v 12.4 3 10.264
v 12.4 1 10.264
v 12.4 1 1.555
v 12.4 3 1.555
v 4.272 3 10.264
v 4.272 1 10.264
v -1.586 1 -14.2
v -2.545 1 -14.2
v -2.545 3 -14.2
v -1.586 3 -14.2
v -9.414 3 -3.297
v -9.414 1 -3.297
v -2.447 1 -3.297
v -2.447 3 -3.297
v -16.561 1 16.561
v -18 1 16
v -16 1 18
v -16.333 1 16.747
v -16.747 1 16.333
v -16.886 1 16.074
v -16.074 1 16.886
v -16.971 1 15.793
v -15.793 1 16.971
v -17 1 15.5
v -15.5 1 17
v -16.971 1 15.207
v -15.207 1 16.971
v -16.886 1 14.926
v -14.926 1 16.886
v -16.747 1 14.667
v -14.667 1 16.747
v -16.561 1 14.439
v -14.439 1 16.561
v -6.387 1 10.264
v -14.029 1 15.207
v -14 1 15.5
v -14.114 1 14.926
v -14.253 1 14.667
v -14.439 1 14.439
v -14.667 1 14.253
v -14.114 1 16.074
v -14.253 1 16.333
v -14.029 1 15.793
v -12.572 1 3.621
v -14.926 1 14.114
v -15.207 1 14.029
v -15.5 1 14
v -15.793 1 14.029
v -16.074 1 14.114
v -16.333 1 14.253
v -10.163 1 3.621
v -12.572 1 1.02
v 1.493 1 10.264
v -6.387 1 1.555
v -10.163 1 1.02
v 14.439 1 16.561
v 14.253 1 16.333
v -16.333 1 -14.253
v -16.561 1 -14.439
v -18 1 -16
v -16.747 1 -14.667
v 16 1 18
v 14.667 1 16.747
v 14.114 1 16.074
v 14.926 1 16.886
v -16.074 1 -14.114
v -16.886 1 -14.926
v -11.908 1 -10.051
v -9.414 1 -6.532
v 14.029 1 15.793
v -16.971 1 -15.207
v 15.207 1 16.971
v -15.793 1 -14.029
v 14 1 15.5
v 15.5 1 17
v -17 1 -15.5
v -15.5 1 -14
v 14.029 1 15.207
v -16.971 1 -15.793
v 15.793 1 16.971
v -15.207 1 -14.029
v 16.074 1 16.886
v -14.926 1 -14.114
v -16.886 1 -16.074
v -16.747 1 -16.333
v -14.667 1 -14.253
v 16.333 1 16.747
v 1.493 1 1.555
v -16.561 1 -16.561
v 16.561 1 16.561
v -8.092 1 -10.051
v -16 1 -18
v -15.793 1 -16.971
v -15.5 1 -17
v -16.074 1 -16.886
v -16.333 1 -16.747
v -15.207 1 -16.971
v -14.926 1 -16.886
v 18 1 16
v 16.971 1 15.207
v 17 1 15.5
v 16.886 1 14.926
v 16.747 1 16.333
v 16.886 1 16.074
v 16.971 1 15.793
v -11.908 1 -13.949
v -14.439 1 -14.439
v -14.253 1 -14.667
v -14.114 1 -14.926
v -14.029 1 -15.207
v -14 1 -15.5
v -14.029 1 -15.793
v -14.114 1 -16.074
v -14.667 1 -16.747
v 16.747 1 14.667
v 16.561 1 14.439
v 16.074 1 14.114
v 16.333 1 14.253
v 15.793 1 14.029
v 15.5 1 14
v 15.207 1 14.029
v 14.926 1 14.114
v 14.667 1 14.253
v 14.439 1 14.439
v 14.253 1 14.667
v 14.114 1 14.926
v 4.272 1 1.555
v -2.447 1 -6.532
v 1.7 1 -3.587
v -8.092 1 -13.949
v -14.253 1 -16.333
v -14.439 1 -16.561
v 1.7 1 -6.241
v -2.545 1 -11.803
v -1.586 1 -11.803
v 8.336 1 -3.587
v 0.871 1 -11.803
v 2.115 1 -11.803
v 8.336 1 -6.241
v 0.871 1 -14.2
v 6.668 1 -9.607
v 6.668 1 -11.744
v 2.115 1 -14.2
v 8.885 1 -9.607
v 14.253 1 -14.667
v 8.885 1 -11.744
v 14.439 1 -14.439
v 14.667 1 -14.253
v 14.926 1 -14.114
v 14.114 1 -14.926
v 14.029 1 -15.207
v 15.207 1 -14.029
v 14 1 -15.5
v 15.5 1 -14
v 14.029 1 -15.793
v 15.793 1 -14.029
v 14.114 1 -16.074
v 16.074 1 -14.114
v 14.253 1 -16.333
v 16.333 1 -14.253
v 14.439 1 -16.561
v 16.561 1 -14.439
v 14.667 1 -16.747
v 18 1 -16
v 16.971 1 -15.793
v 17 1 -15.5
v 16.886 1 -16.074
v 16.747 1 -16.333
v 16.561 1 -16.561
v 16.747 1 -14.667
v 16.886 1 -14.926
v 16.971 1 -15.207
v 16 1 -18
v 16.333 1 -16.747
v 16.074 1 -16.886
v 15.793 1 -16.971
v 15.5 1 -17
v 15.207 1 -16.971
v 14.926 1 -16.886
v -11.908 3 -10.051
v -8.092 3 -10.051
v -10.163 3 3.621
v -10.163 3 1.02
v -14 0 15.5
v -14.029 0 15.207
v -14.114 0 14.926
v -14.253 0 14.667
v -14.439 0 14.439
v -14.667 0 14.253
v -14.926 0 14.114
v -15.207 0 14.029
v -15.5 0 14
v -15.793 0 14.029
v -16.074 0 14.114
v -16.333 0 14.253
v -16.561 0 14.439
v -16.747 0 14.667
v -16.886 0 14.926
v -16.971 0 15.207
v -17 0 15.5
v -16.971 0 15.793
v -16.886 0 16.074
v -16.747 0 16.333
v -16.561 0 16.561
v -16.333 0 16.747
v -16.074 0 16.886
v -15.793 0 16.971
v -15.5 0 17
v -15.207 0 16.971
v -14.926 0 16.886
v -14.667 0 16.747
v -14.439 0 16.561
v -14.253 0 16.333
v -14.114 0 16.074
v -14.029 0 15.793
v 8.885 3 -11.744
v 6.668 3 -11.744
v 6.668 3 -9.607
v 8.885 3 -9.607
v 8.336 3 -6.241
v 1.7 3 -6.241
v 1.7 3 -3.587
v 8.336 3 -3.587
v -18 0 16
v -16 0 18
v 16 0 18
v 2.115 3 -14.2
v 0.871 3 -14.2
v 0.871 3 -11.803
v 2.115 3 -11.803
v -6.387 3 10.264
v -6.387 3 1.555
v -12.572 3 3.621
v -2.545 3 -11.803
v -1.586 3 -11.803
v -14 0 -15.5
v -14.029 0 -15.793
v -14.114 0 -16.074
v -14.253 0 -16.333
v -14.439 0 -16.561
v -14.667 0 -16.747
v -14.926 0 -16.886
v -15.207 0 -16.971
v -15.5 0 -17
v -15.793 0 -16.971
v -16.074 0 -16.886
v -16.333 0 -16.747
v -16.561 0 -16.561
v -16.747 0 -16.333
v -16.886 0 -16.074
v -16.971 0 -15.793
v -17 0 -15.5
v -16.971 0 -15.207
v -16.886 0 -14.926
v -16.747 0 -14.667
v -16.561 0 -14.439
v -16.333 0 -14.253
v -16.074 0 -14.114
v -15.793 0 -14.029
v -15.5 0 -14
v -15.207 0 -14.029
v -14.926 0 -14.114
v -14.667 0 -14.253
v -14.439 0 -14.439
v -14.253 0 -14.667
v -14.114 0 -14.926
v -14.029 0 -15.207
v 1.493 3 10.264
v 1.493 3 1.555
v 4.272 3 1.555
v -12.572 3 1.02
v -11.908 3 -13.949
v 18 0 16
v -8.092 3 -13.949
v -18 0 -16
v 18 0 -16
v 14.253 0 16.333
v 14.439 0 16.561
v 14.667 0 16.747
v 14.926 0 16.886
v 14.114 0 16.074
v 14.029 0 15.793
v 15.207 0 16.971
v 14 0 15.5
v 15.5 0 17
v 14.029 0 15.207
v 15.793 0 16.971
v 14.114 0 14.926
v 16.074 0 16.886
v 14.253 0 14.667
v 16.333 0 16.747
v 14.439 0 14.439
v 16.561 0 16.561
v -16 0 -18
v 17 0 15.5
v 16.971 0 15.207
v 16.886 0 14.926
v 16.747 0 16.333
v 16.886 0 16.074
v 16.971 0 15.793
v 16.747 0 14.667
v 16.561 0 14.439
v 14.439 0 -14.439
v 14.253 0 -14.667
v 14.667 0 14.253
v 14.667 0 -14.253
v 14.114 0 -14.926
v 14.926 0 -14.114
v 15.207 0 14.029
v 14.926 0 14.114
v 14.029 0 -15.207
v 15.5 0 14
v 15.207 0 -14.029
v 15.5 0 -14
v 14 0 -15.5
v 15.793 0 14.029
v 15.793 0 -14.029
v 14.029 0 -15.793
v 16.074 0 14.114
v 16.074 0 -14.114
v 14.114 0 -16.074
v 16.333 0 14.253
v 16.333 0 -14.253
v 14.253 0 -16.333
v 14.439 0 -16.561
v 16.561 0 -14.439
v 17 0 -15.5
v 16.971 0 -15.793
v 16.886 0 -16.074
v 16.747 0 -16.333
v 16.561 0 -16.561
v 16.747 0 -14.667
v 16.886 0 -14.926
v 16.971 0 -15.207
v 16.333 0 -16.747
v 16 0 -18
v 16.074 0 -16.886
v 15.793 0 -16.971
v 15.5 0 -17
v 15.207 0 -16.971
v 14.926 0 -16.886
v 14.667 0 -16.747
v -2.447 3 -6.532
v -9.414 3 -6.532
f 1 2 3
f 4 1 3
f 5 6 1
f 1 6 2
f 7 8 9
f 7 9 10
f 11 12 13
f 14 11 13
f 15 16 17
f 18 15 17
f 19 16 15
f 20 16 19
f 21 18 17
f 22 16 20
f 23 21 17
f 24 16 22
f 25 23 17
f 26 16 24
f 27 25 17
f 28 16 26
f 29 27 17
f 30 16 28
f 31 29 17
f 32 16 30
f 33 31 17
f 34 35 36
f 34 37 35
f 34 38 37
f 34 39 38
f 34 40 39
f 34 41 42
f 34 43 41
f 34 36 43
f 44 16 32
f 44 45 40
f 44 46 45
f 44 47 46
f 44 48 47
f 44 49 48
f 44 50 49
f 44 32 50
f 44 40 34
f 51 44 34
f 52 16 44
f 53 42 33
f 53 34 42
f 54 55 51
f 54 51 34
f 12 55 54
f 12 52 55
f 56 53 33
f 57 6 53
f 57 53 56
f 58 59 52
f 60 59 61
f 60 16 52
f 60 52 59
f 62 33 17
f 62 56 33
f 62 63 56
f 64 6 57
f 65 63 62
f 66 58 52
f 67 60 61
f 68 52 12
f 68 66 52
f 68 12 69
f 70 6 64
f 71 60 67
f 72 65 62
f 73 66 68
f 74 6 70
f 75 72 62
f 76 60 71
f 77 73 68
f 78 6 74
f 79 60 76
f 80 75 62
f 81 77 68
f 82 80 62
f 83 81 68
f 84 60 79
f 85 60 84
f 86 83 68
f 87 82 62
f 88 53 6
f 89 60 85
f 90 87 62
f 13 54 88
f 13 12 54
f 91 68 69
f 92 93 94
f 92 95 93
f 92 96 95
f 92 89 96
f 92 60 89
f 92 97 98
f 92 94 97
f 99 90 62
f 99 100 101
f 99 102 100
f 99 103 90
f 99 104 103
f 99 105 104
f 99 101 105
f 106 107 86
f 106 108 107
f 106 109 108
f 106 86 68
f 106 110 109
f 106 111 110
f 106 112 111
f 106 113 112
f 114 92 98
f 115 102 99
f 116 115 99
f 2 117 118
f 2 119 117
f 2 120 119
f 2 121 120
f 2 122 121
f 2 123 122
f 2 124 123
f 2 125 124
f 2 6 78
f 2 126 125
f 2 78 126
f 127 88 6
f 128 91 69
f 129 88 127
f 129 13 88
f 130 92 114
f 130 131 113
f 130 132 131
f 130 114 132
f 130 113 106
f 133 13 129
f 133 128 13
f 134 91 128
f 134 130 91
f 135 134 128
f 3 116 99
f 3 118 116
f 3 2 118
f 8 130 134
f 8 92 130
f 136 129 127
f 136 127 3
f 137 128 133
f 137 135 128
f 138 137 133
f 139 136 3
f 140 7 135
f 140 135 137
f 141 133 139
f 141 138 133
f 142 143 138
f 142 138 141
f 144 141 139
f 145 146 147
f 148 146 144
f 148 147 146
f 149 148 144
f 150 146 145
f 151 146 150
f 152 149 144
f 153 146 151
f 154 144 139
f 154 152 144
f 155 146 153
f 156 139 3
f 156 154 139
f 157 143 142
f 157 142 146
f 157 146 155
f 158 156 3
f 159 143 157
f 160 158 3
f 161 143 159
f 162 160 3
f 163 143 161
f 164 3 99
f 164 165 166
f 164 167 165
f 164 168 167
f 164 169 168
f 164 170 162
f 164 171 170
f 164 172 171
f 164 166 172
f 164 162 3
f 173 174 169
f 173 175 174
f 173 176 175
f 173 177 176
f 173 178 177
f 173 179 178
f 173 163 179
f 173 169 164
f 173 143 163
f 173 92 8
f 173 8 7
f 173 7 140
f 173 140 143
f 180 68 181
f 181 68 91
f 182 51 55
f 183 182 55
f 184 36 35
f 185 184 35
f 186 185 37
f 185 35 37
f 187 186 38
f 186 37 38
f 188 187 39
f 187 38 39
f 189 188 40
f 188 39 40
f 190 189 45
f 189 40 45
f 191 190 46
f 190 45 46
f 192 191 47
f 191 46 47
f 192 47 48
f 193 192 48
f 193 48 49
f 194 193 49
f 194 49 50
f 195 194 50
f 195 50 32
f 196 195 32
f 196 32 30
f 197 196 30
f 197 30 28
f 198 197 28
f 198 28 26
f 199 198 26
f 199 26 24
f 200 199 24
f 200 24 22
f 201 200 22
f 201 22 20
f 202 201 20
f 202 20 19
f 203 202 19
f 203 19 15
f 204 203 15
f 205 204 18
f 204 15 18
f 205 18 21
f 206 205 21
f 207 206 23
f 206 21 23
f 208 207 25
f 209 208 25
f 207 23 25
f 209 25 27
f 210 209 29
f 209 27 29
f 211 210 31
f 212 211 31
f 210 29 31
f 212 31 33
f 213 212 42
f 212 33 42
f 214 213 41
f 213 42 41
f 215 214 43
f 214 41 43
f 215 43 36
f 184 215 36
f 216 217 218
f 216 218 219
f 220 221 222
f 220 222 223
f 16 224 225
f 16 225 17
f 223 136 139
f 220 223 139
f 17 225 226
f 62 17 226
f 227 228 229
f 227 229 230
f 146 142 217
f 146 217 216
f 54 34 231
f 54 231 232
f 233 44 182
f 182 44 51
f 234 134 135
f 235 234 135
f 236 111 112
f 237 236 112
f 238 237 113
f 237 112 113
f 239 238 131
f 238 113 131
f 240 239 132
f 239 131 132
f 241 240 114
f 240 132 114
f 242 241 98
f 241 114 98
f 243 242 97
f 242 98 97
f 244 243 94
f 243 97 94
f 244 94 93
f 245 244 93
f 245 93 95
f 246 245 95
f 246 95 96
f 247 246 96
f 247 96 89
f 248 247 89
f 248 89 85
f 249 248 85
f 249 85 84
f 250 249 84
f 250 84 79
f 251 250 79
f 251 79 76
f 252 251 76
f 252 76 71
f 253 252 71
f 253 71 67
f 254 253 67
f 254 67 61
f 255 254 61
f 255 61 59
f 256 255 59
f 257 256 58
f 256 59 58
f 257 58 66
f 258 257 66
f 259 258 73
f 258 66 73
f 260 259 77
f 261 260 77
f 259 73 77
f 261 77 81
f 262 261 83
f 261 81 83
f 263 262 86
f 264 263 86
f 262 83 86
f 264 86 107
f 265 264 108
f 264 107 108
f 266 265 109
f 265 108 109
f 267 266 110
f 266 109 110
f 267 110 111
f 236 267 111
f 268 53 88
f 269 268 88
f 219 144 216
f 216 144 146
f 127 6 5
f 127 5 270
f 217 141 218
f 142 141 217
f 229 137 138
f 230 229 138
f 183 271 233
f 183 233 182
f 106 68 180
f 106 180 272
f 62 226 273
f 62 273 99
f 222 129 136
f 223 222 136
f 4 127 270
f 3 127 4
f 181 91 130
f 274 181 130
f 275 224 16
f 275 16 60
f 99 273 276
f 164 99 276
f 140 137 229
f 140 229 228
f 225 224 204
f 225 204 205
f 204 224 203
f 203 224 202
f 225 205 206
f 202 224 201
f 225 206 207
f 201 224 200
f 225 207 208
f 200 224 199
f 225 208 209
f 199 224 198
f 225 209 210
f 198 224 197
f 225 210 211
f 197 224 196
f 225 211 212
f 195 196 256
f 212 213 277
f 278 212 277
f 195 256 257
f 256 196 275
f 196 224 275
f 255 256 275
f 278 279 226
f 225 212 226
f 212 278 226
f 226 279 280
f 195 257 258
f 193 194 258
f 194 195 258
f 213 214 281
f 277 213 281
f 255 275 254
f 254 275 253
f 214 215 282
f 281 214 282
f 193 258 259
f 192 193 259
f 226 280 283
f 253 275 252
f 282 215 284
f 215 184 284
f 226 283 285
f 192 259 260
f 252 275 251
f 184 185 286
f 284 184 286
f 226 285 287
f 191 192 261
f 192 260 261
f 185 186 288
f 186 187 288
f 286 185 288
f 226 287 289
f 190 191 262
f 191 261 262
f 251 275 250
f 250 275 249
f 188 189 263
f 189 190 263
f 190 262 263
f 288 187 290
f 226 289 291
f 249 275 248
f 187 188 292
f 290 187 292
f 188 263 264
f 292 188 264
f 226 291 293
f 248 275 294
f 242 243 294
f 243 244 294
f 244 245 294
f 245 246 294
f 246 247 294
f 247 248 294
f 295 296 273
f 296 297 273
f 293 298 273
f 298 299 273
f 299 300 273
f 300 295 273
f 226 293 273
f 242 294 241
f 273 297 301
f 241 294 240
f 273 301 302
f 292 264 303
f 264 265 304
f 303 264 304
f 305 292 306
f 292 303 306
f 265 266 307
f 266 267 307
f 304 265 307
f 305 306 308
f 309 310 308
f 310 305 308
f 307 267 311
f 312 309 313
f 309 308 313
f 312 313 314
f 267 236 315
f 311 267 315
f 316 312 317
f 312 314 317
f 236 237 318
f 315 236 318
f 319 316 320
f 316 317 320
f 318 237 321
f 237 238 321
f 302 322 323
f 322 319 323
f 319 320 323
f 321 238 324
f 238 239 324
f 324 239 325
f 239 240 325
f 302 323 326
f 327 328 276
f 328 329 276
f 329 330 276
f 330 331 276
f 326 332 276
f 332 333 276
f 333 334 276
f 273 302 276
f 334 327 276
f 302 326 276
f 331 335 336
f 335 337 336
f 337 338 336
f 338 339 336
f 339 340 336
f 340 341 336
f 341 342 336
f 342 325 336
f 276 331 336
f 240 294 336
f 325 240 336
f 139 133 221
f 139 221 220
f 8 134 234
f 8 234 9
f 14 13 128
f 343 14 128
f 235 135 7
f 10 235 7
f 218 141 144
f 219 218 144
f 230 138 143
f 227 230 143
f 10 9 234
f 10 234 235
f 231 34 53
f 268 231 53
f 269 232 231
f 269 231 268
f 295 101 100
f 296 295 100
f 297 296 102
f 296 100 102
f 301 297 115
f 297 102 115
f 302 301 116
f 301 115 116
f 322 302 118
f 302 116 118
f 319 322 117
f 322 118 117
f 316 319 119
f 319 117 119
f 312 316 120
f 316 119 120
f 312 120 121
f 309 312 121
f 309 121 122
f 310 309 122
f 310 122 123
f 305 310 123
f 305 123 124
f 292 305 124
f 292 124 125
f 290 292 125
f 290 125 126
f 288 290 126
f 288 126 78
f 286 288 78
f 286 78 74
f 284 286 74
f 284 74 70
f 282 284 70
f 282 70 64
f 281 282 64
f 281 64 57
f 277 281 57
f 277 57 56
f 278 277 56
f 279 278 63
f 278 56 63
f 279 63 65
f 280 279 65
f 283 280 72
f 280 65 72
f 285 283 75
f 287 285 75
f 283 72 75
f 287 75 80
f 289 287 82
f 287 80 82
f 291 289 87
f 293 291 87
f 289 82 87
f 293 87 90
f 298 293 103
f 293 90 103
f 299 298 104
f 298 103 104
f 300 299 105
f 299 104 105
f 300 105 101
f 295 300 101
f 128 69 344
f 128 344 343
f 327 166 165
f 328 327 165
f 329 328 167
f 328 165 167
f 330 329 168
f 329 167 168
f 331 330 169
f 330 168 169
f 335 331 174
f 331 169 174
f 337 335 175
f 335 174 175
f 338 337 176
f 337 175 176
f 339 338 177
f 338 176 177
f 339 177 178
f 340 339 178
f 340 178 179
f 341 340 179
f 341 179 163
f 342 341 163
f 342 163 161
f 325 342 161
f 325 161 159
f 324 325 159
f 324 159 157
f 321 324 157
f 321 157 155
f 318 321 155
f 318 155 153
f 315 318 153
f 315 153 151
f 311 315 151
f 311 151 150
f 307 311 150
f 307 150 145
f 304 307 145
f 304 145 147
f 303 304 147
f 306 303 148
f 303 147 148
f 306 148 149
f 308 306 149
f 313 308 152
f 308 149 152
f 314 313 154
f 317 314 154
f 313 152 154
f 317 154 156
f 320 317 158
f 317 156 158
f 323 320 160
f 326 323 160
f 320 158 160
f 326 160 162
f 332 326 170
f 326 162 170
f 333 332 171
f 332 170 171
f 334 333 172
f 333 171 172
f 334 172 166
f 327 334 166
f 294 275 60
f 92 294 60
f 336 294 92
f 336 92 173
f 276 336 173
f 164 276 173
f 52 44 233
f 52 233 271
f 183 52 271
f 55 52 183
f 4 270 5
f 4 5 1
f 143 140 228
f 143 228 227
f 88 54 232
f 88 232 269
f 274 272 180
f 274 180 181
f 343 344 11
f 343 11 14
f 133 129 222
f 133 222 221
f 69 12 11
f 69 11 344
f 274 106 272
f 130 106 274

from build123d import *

# Parameters (mm, degrees)
SKETCH1_W            = 36
SKETCH1_H            = 36
BOSS_EXTRUDE1_DEPTH  = 1
SKETCH2_W            = 3.81533948
SKETCH2_H            = 3.898281644
SKETCH2_W_2          = 7.879505449
SKETCH2_H_2          = 8.708927076
SKETCH2_W_3          = 8.128331937
SKETCH2_W_4          = 6.63537301
SKETCH2_H_3          = 2.654149204
SKETCH2_W_5          = 6.967141661
SKETCH2_H_4          = 3.234744343
SKETCH2_W_6          = 0.958696997
SKETCH2_H_5          = 2.396742492
SKETCH2_W_7          = 1.244132439
BOSS_EXTRUDE2_DEPTH  = 2
CHAMFER1_SIZE        = 2
SKETCH3_W            = 2.408590064
SKETCH3_H            = 2.601230853
SKETCH3_W_2          = 2.217469356
SKETCH3_H_2          = 2.137281434
BOSS_EXTRUDE3_DEPTH  = 2
SKETCH4_R            = 1.5
CUT_EXTRUDE1_DEPTH   = 2
LPATTERN1_COUNT      = 2
LPATTERN1_PITCH      = 31
LPATTERN1_COUNT_DIR2 = 2
LPATTERN1_PITCH_DIR2 = 31


with BuildPart() as part:
    # Sketch1 → Boss-Extrude1 (new body)
    with BuildSketch(Plane(origin=(0, 0, 0), x_dir=(1, 0, 0), z_dir=(0, 1, 0))):
        Rectangle(SKETCH1_W, SKETCH1_H)
    extrude(amount=BOSS_EXTRUDE1_DEPTH)

    # Sketch2 → Boss-Extrude2 (add)
    with BuildSketch(Plane(origin=(0, 1, 0), x_dir=(1, 0, 0), z_dir=(0, 1, 0))):
        with Locations((-10, 12)):
            Rectangle(SKETCH2_W, SKETCH2_H)
        with Locations((-2.446793798, -5.909629087)):
            Rectangle(SKETCH2_W_2, SKETCH2_H_2)
        with Locations((8.335687344, -5.909629087)):
            Rectangle(SKETCH2_W_3, SKETCH2_H_2)
        with Locations((5.018000839, 4.914323135)):
            Rectangle(SKETCH2_W_4, SKETCH2_H_3)
        with Locations((-5.930364628, 4.914323136)):
            Rectangle(SKETCH2_W_5, SKETCH2_H_4)
        with Locations((-2.06525985, 13.001183991)):
            Rectangle(SKETCH2_W_6, SKETCH2_H_5)
        with Locations((1.492958928, 13.001183991)):
            Rectangle(SKETCH2_W_7, SKETCH2_H_5)
    extrude(amount=BOSS_EXTRUDE2_DEPTH)

    # Chamfer1
    chamfer1_edges = [part.edges().sort_by_distance(p)[0] for p in [
        (18, 0.5, 18),
        (-18, 0.5, 18),
        (-18, 0.5, -18),
        (18, 0.5, -18),
    ]]
    chamfer(chamfer1_edges, length=CHAMFER1_SIZE)

    # Sketch3 → Boss-Extrude3 (add)
    with BuildSketch(Plane(origin=(0, 1, 0), x_dir=(1, 0, 0), z_dir=(0, 1, 0))):
        with Locations((-11.367372892, -2.320698042)):
            Rectangle(SKETCH3_W, SKETCH3_H)
        with Locations((7.776721419, 10.675684916)):
            Rectangle(SKETCH3_W_2, SKETCH3_H_2)
    extrude(amount=BOSS_EXTRUDE3_DEPTH)

    # Sketch4 → Cut-Extrude1 (cut, through all)
    with BuildSketch(Plane(origin=(0, 1, 0), x_dir=(1, 0, 0), z_dir=(0, 1, 0))):
        with Locations((-15.5, 15.5)):
            Circle(SKETCH4_R)
    cut_extrude1 = extrude(amount=-CUT_EXTRUDE1_DEPTH, mode=Mode.SUBTRACT)

    # LPattern1: Cut-Extrude1 2 × 2
    with Locations(*[(i * LPATTERN1_PITCH, 0, j * LPATTERN1_PITCH_DIR2) for i in range(LPATTERN1_COUNT) for j in range(LPATTERN1_COUNT_DIR2) if (i, j) != (0, 0)]):
        add(cut_extrude1, mode=Mode.SUBTRACT)


solid = part.part
